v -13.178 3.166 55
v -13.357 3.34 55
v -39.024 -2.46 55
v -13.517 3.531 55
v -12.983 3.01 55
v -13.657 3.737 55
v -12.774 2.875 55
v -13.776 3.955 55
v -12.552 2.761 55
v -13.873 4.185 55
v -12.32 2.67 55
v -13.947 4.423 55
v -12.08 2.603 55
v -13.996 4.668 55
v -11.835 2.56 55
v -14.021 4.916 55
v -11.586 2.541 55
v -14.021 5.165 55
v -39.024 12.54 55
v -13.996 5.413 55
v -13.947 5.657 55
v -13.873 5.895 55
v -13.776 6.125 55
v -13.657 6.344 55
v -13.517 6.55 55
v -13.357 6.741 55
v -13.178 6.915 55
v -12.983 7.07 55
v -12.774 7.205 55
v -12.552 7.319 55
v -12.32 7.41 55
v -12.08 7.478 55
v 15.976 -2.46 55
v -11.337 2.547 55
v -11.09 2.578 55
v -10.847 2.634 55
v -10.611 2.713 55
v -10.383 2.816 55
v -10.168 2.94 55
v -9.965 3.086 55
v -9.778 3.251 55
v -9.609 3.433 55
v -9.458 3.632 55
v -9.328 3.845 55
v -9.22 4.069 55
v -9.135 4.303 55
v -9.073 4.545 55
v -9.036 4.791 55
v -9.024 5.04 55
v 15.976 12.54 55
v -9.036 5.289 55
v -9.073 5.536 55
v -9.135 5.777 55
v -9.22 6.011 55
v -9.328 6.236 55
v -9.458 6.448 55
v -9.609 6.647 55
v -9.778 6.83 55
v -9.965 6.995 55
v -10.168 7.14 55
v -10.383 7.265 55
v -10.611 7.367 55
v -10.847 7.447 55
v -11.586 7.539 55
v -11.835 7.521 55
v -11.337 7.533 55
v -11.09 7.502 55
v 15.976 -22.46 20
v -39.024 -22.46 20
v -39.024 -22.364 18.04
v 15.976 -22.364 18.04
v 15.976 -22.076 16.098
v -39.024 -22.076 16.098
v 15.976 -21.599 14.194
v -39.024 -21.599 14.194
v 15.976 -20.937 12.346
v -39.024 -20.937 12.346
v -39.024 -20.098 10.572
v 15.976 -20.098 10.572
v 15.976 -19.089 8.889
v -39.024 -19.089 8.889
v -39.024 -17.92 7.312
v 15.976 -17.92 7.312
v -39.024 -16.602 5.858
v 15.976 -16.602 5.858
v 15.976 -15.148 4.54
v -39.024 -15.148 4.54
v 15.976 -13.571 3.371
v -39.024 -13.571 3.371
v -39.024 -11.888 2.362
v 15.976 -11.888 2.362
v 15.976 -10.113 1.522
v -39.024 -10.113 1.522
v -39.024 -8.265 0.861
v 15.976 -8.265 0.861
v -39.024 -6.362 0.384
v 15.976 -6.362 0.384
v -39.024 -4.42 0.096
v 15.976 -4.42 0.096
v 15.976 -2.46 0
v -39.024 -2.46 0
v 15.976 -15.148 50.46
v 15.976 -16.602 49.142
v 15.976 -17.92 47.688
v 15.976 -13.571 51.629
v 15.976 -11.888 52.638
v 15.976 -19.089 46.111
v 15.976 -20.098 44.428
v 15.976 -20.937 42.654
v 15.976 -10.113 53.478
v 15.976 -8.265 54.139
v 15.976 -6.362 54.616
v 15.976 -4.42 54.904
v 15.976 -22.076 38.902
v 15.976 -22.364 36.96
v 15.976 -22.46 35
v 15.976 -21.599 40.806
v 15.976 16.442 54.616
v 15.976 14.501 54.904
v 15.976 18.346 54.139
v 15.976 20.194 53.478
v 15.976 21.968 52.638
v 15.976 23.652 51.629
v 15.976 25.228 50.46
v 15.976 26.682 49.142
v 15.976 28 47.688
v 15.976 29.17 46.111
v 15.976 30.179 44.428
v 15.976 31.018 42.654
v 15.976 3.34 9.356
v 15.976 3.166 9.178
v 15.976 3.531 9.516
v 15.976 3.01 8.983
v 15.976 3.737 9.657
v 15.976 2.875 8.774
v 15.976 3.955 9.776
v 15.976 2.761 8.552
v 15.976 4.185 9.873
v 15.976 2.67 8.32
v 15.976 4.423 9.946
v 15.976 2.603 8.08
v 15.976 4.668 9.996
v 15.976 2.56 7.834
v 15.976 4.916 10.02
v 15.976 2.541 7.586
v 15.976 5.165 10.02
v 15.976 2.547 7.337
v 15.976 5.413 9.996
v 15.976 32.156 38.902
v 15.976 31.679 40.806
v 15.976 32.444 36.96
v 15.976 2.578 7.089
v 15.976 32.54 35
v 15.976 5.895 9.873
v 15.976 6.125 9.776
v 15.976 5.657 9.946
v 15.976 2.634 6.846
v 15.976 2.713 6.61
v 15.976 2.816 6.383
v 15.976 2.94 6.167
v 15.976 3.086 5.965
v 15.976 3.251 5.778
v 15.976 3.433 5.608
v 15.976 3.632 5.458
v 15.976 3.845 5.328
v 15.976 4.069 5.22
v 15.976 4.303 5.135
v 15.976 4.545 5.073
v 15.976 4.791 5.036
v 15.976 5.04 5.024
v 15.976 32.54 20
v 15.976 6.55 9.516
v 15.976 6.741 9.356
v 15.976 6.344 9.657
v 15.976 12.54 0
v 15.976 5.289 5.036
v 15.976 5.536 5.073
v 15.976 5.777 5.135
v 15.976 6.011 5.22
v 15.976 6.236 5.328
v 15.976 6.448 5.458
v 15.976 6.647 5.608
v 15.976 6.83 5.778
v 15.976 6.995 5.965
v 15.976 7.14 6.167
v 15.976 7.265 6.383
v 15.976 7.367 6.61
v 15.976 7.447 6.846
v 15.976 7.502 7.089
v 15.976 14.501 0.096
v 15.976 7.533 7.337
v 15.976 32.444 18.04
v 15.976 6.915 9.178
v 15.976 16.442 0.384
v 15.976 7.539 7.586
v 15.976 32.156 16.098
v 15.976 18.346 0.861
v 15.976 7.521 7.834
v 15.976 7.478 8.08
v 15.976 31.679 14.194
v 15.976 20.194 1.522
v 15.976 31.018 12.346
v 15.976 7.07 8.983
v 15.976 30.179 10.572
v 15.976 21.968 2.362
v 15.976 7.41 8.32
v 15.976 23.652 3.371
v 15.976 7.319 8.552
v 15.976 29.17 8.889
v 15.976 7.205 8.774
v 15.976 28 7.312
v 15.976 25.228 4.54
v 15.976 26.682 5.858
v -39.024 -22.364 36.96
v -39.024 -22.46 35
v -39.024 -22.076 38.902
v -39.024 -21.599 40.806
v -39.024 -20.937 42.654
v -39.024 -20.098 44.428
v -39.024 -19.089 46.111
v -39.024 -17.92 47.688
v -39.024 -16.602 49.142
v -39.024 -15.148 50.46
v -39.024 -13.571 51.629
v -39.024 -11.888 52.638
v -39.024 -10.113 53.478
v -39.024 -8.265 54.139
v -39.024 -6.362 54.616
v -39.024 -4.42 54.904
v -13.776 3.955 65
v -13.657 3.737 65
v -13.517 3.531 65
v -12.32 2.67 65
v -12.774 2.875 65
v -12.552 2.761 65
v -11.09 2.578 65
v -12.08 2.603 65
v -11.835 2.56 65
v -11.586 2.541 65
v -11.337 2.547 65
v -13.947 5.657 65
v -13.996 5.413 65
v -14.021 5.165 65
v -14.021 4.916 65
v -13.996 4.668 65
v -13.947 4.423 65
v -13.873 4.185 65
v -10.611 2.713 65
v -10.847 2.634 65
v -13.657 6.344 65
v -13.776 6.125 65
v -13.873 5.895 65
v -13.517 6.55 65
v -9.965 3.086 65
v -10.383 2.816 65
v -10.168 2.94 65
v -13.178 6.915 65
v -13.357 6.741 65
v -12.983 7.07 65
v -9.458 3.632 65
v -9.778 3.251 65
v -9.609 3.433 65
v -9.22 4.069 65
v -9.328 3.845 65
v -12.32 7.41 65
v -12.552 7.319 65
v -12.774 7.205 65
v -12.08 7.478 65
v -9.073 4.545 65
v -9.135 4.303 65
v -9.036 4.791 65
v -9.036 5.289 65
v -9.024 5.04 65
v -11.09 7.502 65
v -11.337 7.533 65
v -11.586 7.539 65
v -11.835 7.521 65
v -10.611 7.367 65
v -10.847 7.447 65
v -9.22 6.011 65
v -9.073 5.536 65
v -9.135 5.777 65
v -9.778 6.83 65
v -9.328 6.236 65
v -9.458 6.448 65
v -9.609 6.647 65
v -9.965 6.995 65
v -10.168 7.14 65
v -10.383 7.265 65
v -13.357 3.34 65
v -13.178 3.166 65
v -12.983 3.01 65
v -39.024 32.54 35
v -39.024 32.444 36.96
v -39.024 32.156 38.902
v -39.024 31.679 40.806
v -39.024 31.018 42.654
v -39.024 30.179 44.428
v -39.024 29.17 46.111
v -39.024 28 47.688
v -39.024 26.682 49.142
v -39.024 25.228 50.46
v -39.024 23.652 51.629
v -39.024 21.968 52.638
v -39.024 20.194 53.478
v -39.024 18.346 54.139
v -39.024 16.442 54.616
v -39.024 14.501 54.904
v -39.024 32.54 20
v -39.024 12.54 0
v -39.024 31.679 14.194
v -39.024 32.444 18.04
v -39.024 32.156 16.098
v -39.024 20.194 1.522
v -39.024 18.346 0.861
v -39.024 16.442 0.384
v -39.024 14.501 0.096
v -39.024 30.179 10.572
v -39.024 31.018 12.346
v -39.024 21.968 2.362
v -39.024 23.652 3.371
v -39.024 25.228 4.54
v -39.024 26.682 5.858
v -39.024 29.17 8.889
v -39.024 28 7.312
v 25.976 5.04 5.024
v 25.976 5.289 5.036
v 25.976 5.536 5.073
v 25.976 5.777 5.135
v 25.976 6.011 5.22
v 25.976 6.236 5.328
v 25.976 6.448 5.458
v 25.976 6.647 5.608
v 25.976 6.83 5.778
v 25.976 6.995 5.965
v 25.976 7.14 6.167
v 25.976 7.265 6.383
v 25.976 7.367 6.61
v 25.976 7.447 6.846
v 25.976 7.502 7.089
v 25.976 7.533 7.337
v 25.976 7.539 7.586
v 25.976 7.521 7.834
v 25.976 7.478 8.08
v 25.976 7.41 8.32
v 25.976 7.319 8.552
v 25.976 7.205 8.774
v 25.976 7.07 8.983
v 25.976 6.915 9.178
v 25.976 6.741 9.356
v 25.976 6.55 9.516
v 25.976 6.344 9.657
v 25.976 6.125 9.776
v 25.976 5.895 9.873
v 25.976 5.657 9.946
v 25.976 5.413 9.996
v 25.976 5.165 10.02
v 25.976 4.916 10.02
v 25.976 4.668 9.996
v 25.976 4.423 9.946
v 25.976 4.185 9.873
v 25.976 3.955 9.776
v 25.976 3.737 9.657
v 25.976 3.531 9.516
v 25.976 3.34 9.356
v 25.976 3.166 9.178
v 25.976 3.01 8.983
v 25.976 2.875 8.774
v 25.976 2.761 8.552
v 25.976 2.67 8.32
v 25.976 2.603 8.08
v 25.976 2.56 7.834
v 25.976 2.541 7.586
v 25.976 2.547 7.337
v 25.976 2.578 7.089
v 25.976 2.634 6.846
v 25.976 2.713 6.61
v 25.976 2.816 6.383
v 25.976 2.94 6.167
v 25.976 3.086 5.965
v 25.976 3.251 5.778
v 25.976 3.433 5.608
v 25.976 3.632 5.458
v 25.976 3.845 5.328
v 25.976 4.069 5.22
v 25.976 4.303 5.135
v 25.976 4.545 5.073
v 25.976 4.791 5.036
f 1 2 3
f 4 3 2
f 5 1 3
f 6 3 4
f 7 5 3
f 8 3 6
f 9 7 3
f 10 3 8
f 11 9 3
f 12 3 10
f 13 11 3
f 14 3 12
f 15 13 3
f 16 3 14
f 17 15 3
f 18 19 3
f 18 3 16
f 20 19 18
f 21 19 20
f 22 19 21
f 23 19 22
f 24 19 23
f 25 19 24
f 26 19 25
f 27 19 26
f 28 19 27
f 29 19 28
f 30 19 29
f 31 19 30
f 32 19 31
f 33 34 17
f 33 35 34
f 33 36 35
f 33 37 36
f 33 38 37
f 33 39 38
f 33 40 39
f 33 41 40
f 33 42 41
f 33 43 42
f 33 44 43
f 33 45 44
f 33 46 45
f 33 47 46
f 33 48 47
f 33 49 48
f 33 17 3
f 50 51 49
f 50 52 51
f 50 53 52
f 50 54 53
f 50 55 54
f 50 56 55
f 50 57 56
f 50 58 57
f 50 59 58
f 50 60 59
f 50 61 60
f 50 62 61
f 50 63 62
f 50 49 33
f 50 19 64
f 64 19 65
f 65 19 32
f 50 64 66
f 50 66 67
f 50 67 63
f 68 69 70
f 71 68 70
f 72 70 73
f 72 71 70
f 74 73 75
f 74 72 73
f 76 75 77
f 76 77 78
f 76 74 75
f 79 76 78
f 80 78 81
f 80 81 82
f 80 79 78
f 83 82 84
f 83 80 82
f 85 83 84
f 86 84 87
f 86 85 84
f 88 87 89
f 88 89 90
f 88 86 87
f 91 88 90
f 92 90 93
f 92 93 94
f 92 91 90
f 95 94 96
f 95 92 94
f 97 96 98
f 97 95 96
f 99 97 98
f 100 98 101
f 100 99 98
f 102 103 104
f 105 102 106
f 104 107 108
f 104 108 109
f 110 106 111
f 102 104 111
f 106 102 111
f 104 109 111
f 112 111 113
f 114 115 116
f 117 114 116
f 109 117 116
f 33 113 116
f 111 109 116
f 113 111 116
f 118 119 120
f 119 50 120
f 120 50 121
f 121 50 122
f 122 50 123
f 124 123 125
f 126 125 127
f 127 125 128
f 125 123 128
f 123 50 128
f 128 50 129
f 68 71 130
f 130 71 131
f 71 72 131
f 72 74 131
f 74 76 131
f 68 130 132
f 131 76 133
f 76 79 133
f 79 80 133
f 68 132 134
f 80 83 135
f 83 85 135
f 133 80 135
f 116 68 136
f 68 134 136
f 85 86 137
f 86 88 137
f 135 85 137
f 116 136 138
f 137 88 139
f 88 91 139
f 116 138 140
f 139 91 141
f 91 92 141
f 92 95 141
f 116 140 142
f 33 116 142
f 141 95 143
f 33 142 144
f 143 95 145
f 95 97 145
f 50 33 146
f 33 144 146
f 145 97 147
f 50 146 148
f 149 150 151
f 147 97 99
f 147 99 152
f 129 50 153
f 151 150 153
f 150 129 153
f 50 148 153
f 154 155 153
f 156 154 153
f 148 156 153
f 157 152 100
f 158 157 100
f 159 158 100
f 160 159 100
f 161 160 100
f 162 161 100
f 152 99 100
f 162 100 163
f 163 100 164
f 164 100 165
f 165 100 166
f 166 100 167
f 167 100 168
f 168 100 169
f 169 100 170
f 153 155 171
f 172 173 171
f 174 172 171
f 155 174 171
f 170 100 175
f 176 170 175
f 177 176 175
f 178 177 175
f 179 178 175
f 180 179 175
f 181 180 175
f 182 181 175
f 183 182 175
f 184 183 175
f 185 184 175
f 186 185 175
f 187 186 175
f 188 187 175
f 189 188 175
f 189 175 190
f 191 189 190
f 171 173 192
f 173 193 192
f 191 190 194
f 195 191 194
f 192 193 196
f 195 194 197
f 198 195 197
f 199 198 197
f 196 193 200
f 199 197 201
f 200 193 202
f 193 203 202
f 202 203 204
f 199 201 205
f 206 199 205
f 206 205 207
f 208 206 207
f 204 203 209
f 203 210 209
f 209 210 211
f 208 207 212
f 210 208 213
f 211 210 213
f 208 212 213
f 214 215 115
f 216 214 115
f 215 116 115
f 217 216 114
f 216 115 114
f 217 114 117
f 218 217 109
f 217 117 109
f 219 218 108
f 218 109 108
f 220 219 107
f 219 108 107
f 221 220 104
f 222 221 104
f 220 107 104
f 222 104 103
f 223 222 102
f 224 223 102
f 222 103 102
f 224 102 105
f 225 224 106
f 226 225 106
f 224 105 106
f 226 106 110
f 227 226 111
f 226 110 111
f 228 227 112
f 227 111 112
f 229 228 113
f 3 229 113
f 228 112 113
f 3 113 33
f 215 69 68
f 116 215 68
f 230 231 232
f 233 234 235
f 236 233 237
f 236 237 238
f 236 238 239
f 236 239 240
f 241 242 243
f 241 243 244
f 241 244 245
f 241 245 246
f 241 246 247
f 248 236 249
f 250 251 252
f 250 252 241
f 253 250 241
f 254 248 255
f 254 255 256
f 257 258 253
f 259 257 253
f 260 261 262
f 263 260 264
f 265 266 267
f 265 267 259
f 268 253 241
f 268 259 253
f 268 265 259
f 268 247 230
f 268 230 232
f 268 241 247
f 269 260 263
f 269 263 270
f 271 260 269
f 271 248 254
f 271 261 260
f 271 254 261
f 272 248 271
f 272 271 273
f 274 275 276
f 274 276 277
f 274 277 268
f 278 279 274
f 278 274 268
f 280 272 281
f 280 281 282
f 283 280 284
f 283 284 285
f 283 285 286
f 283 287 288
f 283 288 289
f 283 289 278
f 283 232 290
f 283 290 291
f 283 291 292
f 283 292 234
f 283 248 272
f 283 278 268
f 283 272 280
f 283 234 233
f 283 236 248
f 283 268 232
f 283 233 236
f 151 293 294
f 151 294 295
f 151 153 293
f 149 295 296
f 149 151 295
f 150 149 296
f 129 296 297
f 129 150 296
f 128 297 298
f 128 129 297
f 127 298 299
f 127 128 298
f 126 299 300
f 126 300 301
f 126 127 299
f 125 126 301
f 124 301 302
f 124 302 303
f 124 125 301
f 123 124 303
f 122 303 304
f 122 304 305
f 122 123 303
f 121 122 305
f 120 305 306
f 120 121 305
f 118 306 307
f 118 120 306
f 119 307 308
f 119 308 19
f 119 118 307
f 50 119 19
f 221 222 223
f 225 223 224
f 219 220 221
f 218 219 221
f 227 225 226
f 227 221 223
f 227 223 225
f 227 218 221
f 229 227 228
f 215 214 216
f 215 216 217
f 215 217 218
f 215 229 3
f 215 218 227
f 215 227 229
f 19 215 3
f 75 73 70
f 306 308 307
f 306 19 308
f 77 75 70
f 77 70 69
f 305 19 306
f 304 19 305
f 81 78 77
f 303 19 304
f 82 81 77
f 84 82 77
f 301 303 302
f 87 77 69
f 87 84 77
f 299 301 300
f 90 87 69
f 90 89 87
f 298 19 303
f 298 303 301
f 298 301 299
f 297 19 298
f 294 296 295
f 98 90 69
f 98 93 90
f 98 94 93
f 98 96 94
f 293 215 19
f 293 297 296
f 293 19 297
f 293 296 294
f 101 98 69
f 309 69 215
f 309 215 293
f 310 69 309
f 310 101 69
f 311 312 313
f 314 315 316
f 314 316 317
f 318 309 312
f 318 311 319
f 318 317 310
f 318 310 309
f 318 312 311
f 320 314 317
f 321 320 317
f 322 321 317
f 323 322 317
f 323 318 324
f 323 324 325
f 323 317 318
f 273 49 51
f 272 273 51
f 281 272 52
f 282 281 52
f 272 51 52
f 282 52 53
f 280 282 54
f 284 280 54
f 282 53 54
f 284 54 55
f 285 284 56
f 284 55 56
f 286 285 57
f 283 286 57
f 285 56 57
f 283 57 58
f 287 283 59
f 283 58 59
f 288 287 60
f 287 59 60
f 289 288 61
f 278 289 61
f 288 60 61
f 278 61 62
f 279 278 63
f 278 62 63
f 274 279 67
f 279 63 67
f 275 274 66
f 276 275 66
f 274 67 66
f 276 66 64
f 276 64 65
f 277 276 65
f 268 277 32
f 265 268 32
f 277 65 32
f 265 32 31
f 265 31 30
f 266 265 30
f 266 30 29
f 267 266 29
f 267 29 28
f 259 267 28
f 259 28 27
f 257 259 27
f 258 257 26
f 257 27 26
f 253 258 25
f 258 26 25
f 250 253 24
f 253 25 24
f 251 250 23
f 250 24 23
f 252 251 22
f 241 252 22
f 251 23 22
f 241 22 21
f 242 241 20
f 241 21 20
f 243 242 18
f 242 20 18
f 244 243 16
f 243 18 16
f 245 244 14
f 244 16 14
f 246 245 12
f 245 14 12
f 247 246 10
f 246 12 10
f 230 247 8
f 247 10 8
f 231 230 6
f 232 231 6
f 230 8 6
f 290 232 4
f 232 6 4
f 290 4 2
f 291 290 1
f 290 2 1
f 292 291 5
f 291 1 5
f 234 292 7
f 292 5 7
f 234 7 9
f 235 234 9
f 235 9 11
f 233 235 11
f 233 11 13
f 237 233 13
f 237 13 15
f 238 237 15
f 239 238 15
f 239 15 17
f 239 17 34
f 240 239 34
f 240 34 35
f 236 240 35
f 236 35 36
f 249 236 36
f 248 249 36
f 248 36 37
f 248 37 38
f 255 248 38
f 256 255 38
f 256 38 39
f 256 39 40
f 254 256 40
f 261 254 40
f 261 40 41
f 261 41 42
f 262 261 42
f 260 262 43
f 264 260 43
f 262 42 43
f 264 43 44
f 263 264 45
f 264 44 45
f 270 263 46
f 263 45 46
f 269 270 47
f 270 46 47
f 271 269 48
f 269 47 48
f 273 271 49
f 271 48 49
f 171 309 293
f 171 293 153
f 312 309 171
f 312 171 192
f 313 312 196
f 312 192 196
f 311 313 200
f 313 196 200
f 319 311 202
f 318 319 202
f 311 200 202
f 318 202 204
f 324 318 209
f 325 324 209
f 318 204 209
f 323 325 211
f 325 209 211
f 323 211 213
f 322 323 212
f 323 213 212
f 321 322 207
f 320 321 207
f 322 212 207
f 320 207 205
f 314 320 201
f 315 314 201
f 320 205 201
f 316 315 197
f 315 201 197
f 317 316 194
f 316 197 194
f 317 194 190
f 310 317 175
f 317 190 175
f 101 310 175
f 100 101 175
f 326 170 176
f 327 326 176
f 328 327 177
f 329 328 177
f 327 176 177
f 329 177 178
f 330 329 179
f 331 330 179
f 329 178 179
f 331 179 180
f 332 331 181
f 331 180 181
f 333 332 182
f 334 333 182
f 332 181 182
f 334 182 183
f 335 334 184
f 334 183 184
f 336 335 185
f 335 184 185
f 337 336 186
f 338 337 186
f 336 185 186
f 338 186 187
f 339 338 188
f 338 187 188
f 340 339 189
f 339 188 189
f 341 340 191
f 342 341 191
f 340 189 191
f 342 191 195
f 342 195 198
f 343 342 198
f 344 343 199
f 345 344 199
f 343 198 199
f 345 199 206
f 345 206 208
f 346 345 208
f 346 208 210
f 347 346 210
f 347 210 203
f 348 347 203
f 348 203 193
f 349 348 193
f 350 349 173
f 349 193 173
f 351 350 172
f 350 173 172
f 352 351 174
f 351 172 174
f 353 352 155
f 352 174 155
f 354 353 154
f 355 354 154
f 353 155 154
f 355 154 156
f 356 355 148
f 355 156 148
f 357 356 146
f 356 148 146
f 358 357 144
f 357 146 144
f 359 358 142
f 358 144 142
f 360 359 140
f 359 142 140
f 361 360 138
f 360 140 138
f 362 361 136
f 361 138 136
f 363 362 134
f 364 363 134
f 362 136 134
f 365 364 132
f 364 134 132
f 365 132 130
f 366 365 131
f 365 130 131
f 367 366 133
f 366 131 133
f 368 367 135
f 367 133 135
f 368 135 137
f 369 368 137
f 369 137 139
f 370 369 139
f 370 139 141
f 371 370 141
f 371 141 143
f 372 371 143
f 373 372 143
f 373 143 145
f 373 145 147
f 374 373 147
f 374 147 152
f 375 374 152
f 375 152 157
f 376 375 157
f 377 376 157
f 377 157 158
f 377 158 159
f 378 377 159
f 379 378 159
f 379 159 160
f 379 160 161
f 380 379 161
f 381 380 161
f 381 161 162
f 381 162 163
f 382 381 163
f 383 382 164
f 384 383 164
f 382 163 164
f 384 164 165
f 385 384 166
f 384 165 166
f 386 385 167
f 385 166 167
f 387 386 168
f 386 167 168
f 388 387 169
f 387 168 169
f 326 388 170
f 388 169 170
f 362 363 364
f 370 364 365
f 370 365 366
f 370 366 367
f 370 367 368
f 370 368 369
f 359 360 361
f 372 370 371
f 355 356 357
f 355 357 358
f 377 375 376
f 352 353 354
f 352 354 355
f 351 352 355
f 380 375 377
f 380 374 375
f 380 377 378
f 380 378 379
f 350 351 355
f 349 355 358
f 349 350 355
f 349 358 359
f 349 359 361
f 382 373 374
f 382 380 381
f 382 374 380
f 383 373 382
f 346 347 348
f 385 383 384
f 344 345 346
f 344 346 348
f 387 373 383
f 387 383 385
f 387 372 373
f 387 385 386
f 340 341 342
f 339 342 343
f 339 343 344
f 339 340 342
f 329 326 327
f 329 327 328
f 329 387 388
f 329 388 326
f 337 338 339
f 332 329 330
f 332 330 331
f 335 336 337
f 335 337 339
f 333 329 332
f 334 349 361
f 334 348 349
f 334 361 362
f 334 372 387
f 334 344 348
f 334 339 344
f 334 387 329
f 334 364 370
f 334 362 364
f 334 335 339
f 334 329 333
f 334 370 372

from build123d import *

# Parameters (mm, degrees)
SKETCH_1_W      = 55
SKETCH_1_H      = 55
EXTRUDE_1_DEPTH = 55
SKETCH_2_R      = 2.5
EXTRUDE_2_DEPTH = 10
SKETCH_3_R      = 2.5
EXTRUDE_3_DEPTH = 10
FILLET_1_R      = 20


with BuildPart() as part:
    # Эскиз1 → Бобышка-Вытянуть1 (new body)
    with BuildSketch(Plane.XY):
        with Locations((-11.523913591, 5.040193617)):
            Rectangle(SKETCH_1_W, SKETCH_1_H)
    extrude(amount=EXTRUDE_1_DEPTH)

    # Эскиз2 → Бобышка-Вытянуть2 (add)
    with BuildSketch(Plane(origin=(15.976086409, 0, 0), x_dir=(0, 0, -1), z_dir=(1, 0, 0))):
        with Locations((-7.523581631, 5.040193617)):
            Circle(SKETCH_2_R)
    extrude(amount=EXTRUDE_2_DEPTH)

    # Эскиз3 → Бобышка-Вытянуть3 (add)
    with BuildSketch(Plane.XY.offset(55)):
        with Locations((-11.523913591, 5.040193617)):
            Circle(SKETCH_3_R)
    extrude(amount=EXTRUDE_3_DEPTH)

    # Скругление1
    fillet_1_edges = [part.edges().sort_by_distance(p)[0] for p in [
        (-11.523913591, 32.540193617, 55),
        (-11.523913591, 32.540193617, 0),
        (-11.523913591, -22.459806383, 0),
        (-11.523913591, -22.459806383, 55),
    ]]
    fillet(fillet_1_edges, radius=FILLET_1_R)


solid = part.part
